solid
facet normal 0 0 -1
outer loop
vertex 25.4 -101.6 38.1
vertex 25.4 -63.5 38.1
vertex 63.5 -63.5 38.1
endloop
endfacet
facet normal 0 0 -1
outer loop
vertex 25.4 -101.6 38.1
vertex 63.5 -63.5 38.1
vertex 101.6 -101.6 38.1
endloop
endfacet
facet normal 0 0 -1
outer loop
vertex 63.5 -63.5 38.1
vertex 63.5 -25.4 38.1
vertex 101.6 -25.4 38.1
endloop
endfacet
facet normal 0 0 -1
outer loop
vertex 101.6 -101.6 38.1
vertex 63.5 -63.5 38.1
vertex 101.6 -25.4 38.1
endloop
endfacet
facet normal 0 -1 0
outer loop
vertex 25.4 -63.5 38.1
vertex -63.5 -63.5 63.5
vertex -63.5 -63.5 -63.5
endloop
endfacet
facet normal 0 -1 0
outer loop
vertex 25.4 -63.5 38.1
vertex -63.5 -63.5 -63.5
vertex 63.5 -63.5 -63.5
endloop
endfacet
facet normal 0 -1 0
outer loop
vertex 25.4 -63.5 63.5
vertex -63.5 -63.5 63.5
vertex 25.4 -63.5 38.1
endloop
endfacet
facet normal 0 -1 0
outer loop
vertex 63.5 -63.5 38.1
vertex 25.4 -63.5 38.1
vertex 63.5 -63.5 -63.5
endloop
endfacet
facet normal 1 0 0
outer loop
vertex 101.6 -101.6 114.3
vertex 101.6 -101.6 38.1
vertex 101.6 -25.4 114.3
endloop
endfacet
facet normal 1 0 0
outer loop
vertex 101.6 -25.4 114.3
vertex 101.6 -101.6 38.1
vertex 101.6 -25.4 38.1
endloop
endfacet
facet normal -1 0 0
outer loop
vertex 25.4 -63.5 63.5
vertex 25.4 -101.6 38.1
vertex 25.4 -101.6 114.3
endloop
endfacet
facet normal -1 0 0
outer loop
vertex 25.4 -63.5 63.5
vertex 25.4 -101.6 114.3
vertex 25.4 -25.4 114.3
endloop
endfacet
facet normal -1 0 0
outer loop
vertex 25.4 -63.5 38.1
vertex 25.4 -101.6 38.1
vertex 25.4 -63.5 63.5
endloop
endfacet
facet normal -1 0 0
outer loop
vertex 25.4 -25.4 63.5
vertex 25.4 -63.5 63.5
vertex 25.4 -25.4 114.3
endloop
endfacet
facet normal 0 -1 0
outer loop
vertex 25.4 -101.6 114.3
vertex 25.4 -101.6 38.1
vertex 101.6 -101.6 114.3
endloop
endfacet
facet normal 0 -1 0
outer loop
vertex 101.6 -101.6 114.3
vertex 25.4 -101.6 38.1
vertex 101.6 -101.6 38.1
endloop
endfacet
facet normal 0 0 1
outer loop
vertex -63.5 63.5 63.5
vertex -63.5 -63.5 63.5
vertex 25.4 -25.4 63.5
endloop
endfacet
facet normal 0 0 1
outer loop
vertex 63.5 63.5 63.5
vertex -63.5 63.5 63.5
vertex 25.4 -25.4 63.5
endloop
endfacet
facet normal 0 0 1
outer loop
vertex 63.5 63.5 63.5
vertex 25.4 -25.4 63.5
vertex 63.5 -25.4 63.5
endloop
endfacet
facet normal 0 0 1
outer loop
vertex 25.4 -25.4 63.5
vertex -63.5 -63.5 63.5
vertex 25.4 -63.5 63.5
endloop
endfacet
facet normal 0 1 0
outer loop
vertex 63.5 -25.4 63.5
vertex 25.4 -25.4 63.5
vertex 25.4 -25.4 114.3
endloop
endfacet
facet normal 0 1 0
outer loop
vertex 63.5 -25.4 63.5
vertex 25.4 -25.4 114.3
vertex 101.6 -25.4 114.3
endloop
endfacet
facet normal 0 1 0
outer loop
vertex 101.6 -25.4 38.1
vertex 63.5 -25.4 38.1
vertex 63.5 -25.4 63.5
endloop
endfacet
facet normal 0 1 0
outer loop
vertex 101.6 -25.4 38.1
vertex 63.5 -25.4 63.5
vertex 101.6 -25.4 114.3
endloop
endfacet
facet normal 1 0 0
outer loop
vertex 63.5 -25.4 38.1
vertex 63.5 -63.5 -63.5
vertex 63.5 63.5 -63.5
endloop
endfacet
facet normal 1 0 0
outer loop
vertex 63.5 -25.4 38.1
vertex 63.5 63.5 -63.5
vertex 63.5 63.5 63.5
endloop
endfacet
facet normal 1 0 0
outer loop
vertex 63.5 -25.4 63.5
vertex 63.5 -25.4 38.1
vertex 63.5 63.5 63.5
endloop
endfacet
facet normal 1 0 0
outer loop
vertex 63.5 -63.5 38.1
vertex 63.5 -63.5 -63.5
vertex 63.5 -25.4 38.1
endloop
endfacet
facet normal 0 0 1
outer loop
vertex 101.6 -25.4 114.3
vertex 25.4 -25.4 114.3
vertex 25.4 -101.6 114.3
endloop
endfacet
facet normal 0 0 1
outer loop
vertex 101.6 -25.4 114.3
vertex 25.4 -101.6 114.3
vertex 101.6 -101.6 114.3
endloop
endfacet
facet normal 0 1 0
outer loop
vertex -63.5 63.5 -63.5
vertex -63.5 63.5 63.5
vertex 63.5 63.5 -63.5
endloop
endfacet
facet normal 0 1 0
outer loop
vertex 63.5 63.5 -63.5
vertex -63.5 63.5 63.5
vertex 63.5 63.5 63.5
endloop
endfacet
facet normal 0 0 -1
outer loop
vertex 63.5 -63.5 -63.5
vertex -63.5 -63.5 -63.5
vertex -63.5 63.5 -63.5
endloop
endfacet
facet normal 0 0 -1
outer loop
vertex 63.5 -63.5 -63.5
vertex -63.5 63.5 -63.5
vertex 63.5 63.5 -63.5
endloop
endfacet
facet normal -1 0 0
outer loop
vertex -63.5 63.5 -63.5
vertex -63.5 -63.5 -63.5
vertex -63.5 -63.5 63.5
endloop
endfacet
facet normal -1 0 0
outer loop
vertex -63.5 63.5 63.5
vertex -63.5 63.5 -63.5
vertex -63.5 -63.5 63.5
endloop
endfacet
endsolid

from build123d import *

# Parameters (mm, degrees)
F0_W     = 127
F0_H     = 127
F1_DEPTH = 63.5
F4_DEPTH = 76.2
F5_W     = 38.1
F5_H     = 38.1
F6_DEPTH = 50.8


with BuildPart() as f1:
    # F0 (on Front) → F1 (new body, symmetric)
    with BuildSketch(Plane.XZ):
        Rectangle(F0_W, F0_H)
    extrude(amount=F1_DEPTH, both=True)

    # F3 (on offset) → F4 (join)
    with BuildSketch(Plane.XY.offset(38.1)):
        Polygon((101.6, -25.4), (63.5, -25.4), (63.5, -63.5), (25.4, -63.5), (25.4, -101.6), (101.6, -101.6), align=None)
    extrude(amount=F4_DEPTH)

    # F5 (on face) → F6 (join)
    with BuildSketch(Plane.XY.offset(63.5)):
        with Locations((44.45, -44.45)):
            Rectangle(F5_W, F5_H)
    extrude(amount=F6_DEPTH)


solid = f1.part
